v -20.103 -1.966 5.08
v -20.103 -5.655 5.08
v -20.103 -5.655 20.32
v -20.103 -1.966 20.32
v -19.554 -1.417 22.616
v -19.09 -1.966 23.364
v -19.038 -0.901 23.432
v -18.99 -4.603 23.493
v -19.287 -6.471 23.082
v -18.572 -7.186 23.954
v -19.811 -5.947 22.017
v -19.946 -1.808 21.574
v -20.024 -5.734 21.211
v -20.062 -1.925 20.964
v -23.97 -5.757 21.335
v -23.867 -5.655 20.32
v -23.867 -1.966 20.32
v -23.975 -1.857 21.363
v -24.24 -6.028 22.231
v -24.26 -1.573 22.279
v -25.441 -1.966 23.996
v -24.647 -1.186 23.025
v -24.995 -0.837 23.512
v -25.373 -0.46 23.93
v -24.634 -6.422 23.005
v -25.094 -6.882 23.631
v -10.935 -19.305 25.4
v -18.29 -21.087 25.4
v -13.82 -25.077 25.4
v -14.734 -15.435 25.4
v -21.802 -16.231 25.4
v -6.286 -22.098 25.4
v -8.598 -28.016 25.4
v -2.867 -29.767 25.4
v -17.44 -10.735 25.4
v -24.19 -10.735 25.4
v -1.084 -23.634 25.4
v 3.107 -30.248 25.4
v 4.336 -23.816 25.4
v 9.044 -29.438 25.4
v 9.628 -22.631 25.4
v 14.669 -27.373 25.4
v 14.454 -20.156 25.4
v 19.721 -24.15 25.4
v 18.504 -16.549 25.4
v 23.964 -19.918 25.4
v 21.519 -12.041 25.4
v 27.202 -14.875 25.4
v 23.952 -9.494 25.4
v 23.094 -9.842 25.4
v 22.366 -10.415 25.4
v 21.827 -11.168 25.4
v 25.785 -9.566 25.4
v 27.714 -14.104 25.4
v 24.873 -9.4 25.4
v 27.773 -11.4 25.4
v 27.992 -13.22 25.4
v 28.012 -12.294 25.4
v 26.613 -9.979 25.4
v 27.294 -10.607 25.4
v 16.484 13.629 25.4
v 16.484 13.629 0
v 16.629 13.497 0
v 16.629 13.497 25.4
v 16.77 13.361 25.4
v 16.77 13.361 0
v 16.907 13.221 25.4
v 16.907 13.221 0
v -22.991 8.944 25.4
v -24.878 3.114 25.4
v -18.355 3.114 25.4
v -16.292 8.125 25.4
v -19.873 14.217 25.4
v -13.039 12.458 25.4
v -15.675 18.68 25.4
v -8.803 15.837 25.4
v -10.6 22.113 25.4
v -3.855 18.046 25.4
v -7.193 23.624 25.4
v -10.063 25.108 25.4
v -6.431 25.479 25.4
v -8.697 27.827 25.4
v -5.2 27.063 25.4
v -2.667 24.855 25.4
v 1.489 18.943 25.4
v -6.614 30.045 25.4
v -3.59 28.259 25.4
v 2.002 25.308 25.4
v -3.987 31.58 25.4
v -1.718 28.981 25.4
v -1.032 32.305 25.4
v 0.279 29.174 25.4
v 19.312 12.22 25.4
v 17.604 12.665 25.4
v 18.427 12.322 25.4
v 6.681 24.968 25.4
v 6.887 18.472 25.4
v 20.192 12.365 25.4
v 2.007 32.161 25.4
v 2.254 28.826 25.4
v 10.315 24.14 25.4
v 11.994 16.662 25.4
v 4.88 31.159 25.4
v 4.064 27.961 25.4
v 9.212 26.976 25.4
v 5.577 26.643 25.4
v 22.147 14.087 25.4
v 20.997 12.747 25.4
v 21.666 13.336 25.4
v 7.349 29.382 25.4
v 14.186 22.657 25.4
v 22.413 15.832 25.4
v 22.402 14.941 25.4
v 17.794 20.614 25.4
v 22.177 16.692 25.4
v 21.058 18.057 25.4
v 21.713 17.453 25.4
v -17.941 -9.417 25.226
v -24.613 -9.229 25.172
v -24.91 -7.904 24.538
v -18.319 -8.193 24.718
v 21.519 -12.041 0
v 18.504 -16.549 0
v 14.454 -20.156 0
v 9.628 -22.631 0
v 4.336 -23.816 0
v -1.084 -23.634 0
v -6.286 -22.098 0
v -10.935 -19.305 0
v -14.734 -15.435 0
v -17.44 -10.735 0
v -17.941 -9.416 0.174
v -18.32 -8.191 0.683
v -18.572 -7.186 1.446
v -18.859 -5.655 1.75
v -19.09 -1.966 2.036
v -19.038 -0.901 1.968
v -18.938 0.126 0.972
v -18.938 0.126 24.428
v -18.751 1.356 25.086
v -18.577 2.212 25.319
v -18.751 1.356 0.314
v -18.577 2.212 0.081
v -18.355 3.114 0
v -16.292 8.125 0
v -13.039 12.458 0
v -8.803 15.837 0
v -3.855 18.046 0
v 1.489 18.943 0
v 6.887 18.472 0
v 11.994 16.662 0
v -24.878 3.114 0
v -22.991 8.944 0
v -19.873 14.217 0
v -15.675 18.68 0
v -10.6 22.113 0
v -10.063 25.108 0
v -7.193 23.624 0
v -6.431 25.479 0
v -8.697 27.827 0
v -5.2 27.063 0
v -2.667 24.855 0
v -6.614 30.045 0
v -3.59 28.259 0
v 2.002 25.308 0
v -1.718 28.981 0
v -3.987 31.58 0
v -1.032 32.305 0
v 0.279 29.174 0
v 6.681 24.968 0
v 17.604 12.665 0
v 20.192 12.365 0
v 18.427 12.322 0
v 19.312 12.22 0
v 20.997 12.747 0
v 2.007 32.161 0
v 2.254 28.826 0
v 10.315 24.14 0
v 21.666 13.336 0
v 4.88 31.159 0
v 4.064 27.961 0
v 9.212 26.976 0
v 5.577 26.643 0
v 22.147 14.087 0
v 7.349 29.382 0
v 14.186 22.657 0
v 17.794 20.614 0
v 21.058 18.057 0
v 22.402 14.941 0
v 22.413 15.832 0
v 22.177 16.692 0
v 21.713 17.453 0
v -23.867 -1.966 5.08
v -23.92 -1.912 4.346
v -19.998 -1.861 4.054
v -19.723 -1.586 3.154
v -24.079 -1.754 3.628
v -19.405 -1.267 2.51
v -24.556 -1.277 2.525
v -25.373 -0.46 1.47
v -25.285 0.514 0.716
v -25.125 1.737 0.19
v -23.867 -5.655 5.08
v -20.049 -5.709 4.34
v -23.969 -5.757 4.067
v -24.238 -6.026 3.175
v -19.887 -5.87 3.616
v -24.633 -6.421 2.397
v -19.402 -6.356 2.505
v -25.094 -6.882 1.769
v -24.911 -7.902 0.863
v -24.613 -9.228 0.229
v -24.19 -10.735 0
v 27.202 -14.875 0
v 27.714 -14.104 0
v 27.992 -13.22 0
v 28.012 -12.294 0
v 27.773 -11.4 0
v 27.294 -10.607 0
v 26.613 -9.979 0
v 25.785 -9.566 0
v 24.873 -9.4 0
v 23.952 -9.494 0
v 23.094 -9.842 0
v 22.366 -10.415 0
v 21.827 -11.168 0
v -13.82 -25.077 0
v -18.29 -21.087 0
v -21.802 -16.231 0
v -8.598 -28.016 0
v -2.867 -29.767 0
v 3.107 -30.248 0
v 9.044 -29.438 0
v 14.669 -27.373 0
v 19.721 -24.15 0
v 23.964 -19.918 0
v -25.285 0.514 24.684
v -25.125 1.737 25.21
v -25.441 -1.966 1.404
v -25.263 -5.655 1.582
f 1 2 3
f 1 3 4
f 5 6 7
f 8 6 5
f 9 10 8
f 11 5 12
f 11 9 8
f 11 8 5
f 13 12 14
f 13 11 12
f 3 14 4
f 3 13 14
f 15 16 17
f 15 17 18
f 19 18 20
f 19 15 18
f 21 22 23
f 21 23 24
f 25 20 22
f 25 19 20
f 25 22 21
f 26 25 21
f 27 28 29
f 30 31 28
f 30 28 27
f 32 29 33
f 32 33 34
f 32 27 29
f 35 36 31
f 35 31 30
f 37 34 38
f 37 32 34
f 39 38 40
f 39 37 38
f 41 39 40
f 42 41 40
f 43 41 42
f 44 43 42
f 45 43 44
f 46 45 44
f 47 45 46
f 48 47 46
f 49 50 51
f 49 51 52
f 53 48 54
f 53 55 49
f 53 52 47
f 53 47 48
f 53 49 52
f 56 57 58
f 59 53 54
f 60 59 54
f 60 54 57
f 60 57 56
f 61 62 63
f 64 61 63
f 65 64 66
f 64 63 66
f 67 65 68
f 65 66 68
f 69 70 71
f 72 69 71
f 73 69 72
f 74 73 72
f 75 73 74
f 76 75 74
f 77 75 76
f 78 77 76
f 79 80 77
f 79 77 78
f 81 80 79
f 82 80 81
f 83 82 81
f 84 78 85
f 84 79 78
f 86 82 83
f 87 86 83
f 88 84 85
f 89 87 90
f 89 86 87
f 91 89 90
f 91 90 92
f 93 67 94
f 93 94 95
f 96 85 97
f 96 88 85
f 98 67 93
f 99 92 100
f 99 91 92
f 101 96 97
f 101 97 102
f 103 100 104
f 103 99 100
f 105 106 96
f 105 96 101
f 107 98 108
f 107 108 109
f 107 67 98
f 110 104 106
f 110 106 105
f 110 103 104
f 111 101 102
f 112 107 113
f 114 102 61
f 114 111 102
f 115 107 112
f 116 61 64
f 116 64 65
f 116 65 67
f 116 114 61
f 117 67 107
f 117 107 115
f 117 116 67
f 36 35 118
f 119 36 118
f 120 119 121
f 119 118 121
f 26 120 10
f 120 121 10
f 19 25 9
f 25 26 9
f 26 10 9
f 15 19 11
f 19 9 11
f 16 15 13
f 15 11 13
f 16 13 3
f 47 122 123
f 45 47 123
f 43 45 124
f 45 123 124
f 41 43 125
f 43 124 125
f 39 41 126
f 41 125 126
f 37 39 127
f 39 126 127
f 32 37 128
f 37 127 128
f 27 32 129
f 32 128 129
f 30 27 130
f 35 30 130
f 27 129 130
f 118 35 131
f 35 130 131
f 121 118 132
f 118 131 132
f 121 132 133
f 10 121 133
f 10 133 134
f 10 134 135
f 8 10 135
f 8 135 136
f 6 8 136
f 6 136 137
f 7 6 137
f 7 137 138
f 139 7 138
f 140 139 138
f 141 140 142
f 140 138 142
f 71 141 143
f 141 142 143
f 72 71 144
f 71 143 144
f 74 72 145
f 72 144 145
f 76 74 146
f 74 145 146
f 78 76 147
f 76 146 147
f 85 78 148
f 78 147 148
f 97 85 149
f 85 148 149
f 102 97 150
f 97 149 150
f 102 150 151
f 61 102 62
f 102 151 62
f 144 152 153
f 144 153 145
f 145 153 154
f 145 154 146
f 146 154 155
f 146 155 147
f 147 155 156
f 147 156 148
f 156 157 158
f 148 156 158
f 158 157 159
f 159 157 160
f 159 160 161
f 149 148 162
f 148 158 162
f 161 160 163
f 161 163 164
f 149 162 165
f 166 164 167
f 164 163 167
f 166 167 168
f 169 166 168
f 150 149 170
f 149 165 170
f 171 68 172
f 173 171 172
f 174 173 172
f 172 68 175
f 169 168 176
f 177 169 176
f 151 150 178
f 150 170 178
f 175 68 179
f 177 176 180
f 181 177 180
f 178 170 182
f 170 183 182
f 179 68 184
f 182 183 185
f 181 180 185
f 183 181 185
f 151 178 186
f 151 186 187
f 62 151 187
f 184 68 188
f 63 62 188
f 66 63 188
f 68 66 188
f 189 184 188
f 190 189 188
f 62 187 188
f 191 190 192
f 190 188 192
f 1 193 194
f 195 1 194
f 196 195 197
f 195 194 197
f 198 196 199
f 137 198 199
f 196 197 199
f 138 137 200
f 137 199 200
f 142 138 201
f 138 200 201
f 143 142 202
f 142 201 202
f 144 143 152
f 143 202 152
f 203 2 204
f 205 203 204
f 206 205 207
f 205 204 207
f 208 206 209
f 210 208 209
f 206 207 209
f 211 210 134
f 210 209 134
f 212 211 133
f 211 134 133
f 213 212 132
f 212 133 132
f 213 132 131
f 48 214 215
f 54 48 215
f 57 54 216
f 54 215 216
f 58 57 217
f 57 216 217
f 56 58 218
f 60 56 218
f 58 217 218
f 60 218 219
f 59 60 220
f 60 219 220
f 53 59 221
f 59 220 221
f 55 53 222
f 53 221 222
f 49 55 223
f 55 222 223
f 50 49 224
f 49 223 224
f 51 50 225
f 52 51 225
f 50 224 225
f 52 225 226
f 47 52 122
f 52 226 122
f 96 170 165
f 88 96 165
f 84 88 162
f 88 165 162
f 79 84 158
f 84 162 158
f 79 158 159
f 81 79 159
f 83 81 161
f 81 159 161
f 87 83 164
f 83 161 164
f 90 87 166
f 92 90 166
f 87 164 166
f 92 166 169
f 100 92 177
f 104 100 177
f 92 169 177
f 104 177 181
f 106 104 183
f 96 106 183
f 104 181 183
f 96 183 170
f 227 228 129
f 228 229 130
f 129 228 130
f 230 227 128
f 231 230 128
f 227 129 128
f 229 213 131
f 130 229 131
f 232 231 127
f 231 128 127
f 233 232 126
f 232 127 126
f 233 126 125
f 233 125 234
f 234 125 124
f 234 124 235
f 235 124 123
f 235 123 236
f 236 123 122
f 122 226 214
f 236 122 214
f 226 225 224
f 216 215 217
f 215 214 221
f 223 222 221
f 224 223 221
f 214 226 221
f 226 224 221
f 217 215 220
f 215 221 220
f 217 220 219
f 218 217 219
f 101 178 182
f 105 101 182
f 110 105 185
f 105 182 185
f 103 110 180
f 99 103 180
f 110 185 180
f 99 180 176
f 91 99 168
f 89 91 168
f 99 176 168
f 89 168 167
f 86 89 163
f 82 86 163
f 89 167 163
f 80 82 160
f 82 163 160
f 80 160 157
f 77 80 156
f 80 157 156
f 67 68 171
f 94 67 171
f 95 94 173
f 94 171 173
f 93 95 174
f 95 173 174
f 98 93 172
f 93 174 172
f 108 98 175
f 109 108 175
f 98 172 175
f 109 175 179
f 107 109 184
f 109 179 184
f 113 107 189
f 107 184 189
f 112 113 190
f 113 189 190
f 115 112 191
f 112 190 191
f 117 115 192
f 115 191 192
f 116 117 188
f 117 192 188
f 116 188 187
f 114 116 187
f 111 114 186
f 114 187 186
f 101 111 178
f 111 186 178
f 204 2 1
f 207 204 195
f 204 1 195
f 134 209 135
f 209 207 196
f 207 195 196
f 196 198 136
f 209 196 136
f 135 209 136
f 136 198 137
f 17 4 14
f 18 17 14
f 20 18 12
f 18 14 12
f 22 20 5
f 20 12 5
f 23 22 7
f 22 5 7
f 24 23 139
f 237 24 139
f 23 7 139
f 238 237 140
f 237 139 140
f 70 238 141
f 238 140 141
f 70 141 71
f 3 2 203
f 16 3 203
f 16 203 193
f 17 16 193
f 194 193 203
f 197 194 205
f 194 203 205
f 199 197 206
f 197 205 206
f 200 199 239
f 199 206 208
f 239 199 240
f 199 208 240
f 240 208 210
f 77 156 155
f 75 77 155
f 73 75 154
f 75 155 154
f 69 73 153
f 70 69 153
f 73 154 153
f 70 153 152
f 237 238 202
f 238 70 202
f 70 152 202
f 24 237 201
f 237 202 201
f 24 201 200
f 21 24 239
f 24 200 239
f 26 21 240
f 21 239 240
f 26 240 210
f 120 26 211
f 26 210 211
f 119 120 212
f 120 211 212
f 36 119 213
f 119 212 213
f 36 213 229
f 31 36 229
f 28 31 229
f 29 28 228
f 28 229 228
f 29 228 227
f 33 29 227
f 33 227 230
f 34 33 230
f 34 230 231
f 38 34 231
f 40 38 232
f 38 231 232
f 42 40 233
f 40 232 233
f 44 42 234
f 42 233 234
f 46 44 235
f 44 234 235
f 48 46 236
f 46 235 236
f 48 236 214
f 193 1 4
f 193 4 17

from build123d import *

# Parameters (mm, degrees)
F0_W         = 3.7644430995
F0_H         = 3.6893493962
F1_DEPTH     = 25.4
F3_DEPTH     = 25.4
F4_T1_DEPTH  = 3.6893493962
F5_T1_DEPTH  = 3.6893493962
F6_T4_DEPTH  = 31.7513819576
F6_S5_R      = 5.0800000001
F6_T6_DEPTH  = 18
F6_S7_R      = 5.0799999999
F6_T8_DEPTH  = 18
F6_T12_DEPTH = 31.8046354707
F6_S13_R     = 5.0800000001
F6_T14_DEPTH = 18
F6_S15_R     = 5.0799999999
F6_T16_DEPTH = 18
F7_T1_DEPTH  = 3.6893493962
F7_T3_DEPTH  = 3.7644430995
F7_T9_DEPTH  = 16.3893493962
F7_S11_R     = 27.7843331243
F7_T12_DEPTH = 10
F7_T15_DEPTH = 16.4644430995
F7_S17_R     = 27.7843331243
F7_T18_DEPTH = 10
F7_T24_DEPTH = 16.4644430995
F7_S26_R     = 27.7843331243
F7_T27_DEPTH = 10
F7_T30_DEPTH = 16.3893493962
F7_S32_R     = 27.7843331243
F7_T33_DEPTH = 10
F7_T39_DEPTH = 16.3893493962
F7_S41_R     = 21.4343331243
F7_T42_DEPTH = 10
F7_T45_DEPTH = 16.4644430995
F7_S47_R     = 21.4343331243
F7_T48_DEPTH = 10
F7_T54_DEPTH = 16.3893493962
F7_S56_R     = 21.4343331243
F7_T57_DEPTH = 10
F7_T60_DEPTH = 16.4644430995
F7_S62_R     = 21.4343331243
F7_T63_DEPTH = 10


# Not quite as in the source:
# - a fillet or chamfer that OpenCascade refuses, or shapes differently, is made with other operations: its cross-section is extruded or revolved along the edge and cut away or added


with BuildPart() as f1:
    # F0 (on Top) → F1 (new body)
    with BuildSketch(Plane.XY):
        with BuildLine():
            ThreePointArc((21.5192791075, -12.0412250981), (-18.6952618922, -6.6001770911), (16.4842832794, 13.628859286))
            ThreePointArc((16.4842832794, 13.628859286), (16.7004899528, 13.4298852219), (16.9072606144, 13.2211224445))
            ThreePointArc((16.9072606144, 13.2211224445), (21.6662962935, 13.3359323022), (21.0575650897, 18.0572719658))
            ThreePointArc((21.0575650897, 18.0572719658), (-24.9747625183, -7.5703236346), (27.2017178865, -14.8753721518))
            ThreePointArc((27.2017178865, -14.8753721518), (26.2135164235, -9.7430147231), (21.5192791075, -12.0412250981))
        make_face()
        with Locations((-21.9849217683, -3.8102302933)):
            Rectangle(F0_W, F0_H, mode=Mode.SUBTRACT)
    extrude(amount=F1_DEPTH)

    # F2 (on Top) → F3 (join)
    with BuildSketch(Plane.XY):
        with BuildLine():
            ThreePointArc((-7.1930247185, 23.6237348024), (-0.7260554424, 29.1452143248), (6.6808082429, 24.968277878))
            ThreePointArc((6.6808082429, 24.968277878), (8.51162891, 24.6152301343), (10.3146480708, 24.140183894))
            ThreePointArc((10.3146480708, 24.140183894), (-1.0323167037, 32.3054087872), (-10.6002305361, 22.1132778988))
            ThreePointArc((-10.6002305361, 22.1132778988), (-8.9219828274, 22.9257012198), (-7.1930247185, 23.6237348025))
        make_face()
    extrude(amount=F3_DEPTH)

    # F4: fillet of radius 5.08 on 1 edges, made by hand

    # F4_s2 → F4_t1 (cut)
    with BuildSketch(Plane.XZ.offset(1.9655555952)):
        with BuildLine():
            ThreePointArc((-15.0227002186, 25.4), (-18.614802667, 23.9121024484), (-20.1027002186, 20.32))
            Line((-20.1027002186, 20.32), (-20.1027002186, 25.4))
            Line((-20.1027002186, 25.4), (-15.0227002186, 25.4))
        make_face()
    extrude(amount=F4_T1_DEPTH, mode=Mode.SUBTRACT)

    # F5: fillet of radius 5.08 on 1 edges, made by hand

    # F5_s2 → F5_t1 (cut)
    with BuildSketch(Plane.XZ.offset(1.9655555952)):
        with BuildLine():
            ThreePointArc((-28.9471433181, 25.4), (-25.3550408696, 23.9121024484), (-23.8671433181, 20.32))
            Line((-23.8671433181, 20.32), (-23.8671433181, 25.4))
            Line((-23.8671433181, 25.4), (-28.9471433181, 25.4))
        make_face()
    extrude(amount=F5_T1_DEPTH, mode=Mode.SUBTRACT)

    # F6: fillet of radius 5.08 on 2 edges, made by hand


with BuildPart() as f6_tool2:
    # F6_s3 → F6_t4 (new body)
    with BuildSketch(Plane.YZ.offset(-6.3899983285)):
        with BuildLine():
            ThreePointArc((-1.9655555952, 20.32), (-0.4776580437, 23.9121024484), (3.1144444048, 25.4))
            Line((3.1144444048, 25.4), (-1.9655555952, 25.4))
            Line((-1.9655555952, 25.4), (-1.9655555952, 20.32))
        make_face()
    extrude(amount=-F6_T4_DEPTH)

    # F6_s5 → F6_t6 (cut, symmetric)
    with BuildSketch(Plane.XZ.offset(-0.6)):
        with Locations((-15.0227002185, 20.3199999999)):
            Circle(F6_S5_R)
    extrude(amount=F6_T6_DEPTH, both=True, mode=Mode.SUBTRACT)

    # F6_s7 → F6_t8 (cut, symmetric)
    with BuildSketch(Plane.XZ.offset(-0.6)):
        with Locations((-28.947143318, 20.3200000001)):
            Circle(F6_S7_R)
    extrude(amount=F6_T8_DEPTH, both=True, mode=Mode.SUBTRACT)


with BuildPart() as f1_1:
    add(f1.part)

    # F6_t1: cut F6_tool2
    add(f6_tool2.part, mode=Mode.SUBTRACT)


with BuildPart() as f6_tool10:
    # F6_s11 → F6_t12 (new body)
    with BuildSketch(Plane.YZ.offset(-6.1587934503)):
        with BuildLine():
            ThreePointArc((-10.7349049914, 25.4), (-7.142802543, 23.9121024484), (-5.6549049914, 20.32))
            Line((-5.6549049914, 20.32), (-5.6549049914, 25.4))
            Line((-5.6549049914, 25.4), (-10.7349049914, 25.4))
        make_face()
    extrude(amount=-F6_T12_DEPTH)

    # F6_s13 → F6_t14 (cut, symmetric)
    with BuildSketch(Plane.XZ.offset(8.2)):
        with Locations((-15.0227002185, 20.3199999999)):
            Circle(F6_S13_R)
    extrude(amount=F6_T14_DEPTH, both=True, mode=Mode.SUBTRACT)

    # F6_s15 → F6_t16 (cut, symmetric)
    with BuildSketch(Plane.XZ.offset(8.2)):
        with Locations((-28.947143318, 20.3200000001)):
            Circle(F6_S15_R)
    extrude(amount=F6_T16_DEPTH, both=True, mode=Mode.SUBTRACT)


with BuildPart() as f1_2:
    add(f1_1.part)

    # F6_t9: cut F6_tool10
    add(f6_tool10.part, mode=Mode.SUBTRACT)

    # F7: fillet of radius 5.08 on 4 edges, made by hand

    # F7_s2 → F7_t1 (cut)
    with BuildSketch(Plane.XZ.offset(1.9655555952)):
        with BuildLine():
            ThreePointArc((-23.8671433181, 5.08), (-25.3550408696, 1.4878975516), (-28.9471433181, 0))
            Line((-28.9471433181, 0), (-23.8671433181, 0))
            Line((-23.8671433181, 0), (-23.8671433181, 5.08))
        make_face()
        with BuildLine():
            ThreePointArc((-20.1027002186, 5.08), (-18.614802667, 1.4878975516), (-15.0227002186, 0))
            Line((-15.0227002186, 0), (-20.1027002186, 0))
            Line((-20.1027002186, 0), (-20.1027002186, 5.08))
        make_face()
    extrude(amount=F7_T1_DEPTH, mode=Mode.SUBTRACT)

    # F7_s4 → F7_t3 (cut)
    with BuildSketch(Plane.YZ.offset(-23.8671433181)):
        with BuildLine():
            ThreePointArc((-5.6549049914, 5.08), (-7.142802543, 1.4878975516), (-10.7349049914, 0))
            Line((-10.7349049914, 0), (-5.6549049914, 0))
            Line((-5.6549049914, 0), (-5.6549049914, 5.08))
        make_face()
        with BuildLine():
            ThreePointArc((-1.9655555952, 5.08), (-0.4776580437, 1.4878975516), (3.1144444048, 0))
            Line((3.1144444048, 0), (-1.9655555952, 0))
            Line((-1.9655555952, 0), (-1.9655555952, 5.08))
        make_face()
    extrude(amount=F7_T3_DEPTH, mode=Mode.SUBTRACT)


with BuildPart() as f7_tool7:
    # F7_s8 → F7_t9 (new body)
    with BuildSketch(Plane.XZ.offset(18.3549049914)):
        with BuildLine():
            ThreePointArc((-23.8671433181, 5.08), (-25.3550408696, 1.4878975516), (-28.9471433181, 0))
            Line((-28.9471433181, 0), (-23.8671433181, 0))
            Line((-23.8671433181, 0), (-23.8671433181, 5.08))
        make_face()
    extrude(amount=-F7_T9_DEPTH)

    split(bisect_by=Plane.XZ.offset(5.6549049914), keep=Keep.TOP)

    # F7_s11 → F7_t12 (intersect, symmetric)
    with BuildSketch(Plane.XY.offset(2.5)):
        with Locations((2.3382892257, -2.4746027243)):
            Circle(F7_S11_R)
    extrude(amount=F7_T12_DEPTH, both=True, mode=Mode.INTERSECT)


with BuildPart() as f7_tool13:
    # F7_s14 → F7_t15 (new body)
    with BuildSketch(Plane.YZ.offset(-20.1027002186)):
        with BuildLine():
            ThreePointArc((-5.6549049914, 5.08), (-7.142802543, 1.4878975516), (-10.7349049914, 0))
            Line((-10.7349049914, 0), (-5.6549049914, 0))
            Line((-5.6549049914, 0), (-5.6549049914, 5.08))
        make_face()
    extrude(amount=-F7_T15_DEPTH)

    split(bisect_by=Plane.YZ.offset(-23.8671433181), keep=Keep.BOTTOM)

    # F7_s17 → F7_t18 (intersect, symmetric)
    with BuildSketch(Plane.XY.offset(2.5)):
        with Locations((2.3382892257, -2.4746027243)):
            Circle(F7_S17_R)
    extrude(amount=F7_T18_DEPTH, both=True, mode=Mode.INTERSECT)


with BuildPart() as f7_tool7_1:
    add(f7_tool7.part)

    # F7_t19: intersect F7_tool13
    add(f7_tool13.part, mode=Mode.INTERSECT)


with BuildPart() as f1_3:
    add(f1_2.part)

    # F7_t5: cut F7_tool7
    add(f7_tool7_1.part, mode=Mode.SUBTRACT)


with BuildPart() as f7_tool22:
    # F7_s23 → F7_t24 (new body)
    with BuildSketch(Plane.YZ.offset(-36.5671433181)):
        with BuildLine():
            ThreePointArc((-1.9655555952, 5.08), (-0.4776580437, 1.4878975516), (3.1144444048, 0))
            Line((3.1144444048, 0), (-1.9655555952, 0))
            Line((-1.9655555952, 0), (-1.9655555952, 5.08))
        make_face()
    extrude(amount=F7_T24_DEPTH)

    split(bisect_by=Plane.YZ.offset(-23.8671433181), keep=Keep.BOTTOM)

    # F7_s26 → F7_t27 (intersect, symmetric)
    with BuildSketch(Plane.XY.offset(2.5)):
        with Locations((2.3382892257, -2.4746027243)):
            Circle(F7_S26_R)
    extrude(amount=F7_T27_DEPTH, both=True, mode=Mode.INTERSECT)


with BuildPart() as f7_tool28:
    # F7_s29 → F7_t30 (new body)
    with BuildSketch(Plane.XZ.offset(5.6549049914)):
        with BuildLine():
            ThreePointArc((-23.8671433181, 5.08), (-25.3550408696, 1.4878975516), (-28.9471433181, 0))
            Line((-28.9471433181, 0), (-23.8671433181, 0))
            Line((-23.8671433181, 0), (-23.8671433181, 5.08))
        make_face()
    extrude(amount=-F7_T30_DEPTH)

    split(bisect_by=Plane.XZ.offset(1.9655555952), keep=Keep.BOTTOM)

    # F7_s32 → F7_t33 (intersect, symmetric)
    with BuildSketch(Plane.XY.offset(2.5)):
        with Locations((2.3382892257, -2.4746027243)):
            Circle(F7_S32_R)
    extrude(amount=F7_T33_DEPTH, both=True, mode=Mode.INTERSECT)


with BuildPart() as f7_tool22_1:
    add(f7_tool22.part)

    # F7_t34: intersect F7_tool28
    add(f7_tool28.part, mode=Mode.INTERSECT)


with BuildPart() as f1_4:
    add(f1_3.part)

    # F7_t20: cut F7_tool22
    add(f7_tool22_1.part, mode=Mode.SUBTRACT)


with BuildPart() as f7_tool37:
    # F7_s38 → F7_t39 (new body)
    with BuildSketch(Plane.XZ.offset(-10.7344444048)):
        with BuildLine():
            ThreePointArc((-20.1027002186, 5.08), (-18.614802667, 1.4878975516), (-15.0227002186, 0))
            Line((-15.0227002186, 0), (-20.1027002186, 0))
            Line((-20.1027002186, 0), (-20.1027002186, 5.08))
        make_face()
    extrude(amount=F7_T39_DEPTH)

    split(bisect_by=Plane.XZ.offset(1.9655555952), keep=Keep.BOTTOM)

    # F7_s41 → F7_t42 (cut, symmetric)
    with BuildSketch(Plane.XY.offset(2.5)):
        with Locations((2.3382892257, -2.4746027243)):
            Circle(F7_S41_R)
    extrude(amount=F7_T42_DEPTH, both=True, mode=Mode.SUBTRACT)


with BuildPart() as f7_tool43:
    # F7_s44 → F7_t45 (new body)
    with BuildSketch(Plane.YZ.offset(-23.8671433181)):
        with BuildLine():
            ThreePointArc((-1.9655555952, 5.08), (-0.4776580437, 1.4878975516), (3.1144444048, 0))
            Line((3.1144444048, 0), (-1.9655555952, 0))
            Line((-1.9655555952, 0), (-1.9655555952, 5.08))
        make_face()
    extrude(amount=F7_T45_DEPTH)

    split(bisect_by=Plane.YZ.offset(-20.1027002186), keep=Keep.TOP)

    # F7_s47 → F7_t48 (cut, symmetric)
    with BuildSketch(Plane.XY.offset(2.5)):
        with Locations((2.3382892257, -2.4746027243)):
            Circle(F7_S47_R)
    extrude(amount=F7_T48_DEPTH, both=True, mode=Mode.SUBTRACT)


with BuildPart() as f7_tool37_1:
    add(f7_tool37.part)

    # F7_t49: intersect F7_tool43
    add(f7_tool43.part, mode=Mode.INTERSECT)


with BuildPart() as f1_5:
    add(f1_4.part)

    # F7_t35: cut F7_tool37
    add(f7_tool37_1.part, mode=Mode.SUBTRACT)


with BuildPart() as f7_tool52:
    # F7_s53 → F7_t54 (new body)
    with BuildSketch(Plane.XZ.offset(1.9655555952)):
        with BuildLine():
            ThreePointArc((-20.1027002186, 5.08), (-18.614802667, 1.4878975516), (-15.0227002186, 0))
            Line((-15.0227002186, 0), (-20.1027002186, 0))
            Line((-20.1027002186, 0), (-20.1027002186, 5.08))
        make_face()
    extrude(amount=F7_T54_DEPTH)

    split(bisect_by=Plane.XZ.offset(5.6549049914), keep=Keep.TOP)

    # F7_s56 → F7_t57 (cut, symmetric)
    with BuildSketch(Plane.XY.offset(2.5)):
        with Locations((2.3382892257, -2.4746027243)):
            Circle(F7_S56_R)
    extrude(amount=F7_T57_DEPTH, both=True, mode=Mode.SUBTRACT)


with BuildPart() as f7_tool58:
    # F7_s59 → F7_t60 (new body)
    with BuildSketch(Plane.YZ.offset(-7.4027002186)):
        with BuildLine():
            ThreePointArc((-5.6549049914, 5.08), (-7.142802543, 1.4878975516), (-10.7349049914, 0))
            Line((-10.7349049914, 0), (-5.6549049914, 0))
            Line((-5.6549049914, 0), (-5.6549049914, 5.08))
        make_face()
    extrude(amount=-F7_T60_DEPTH)

    split(bisect_by=Plane.YZ.offset(-20.1027002186), keep=Keep.TOP)

    # F7_s62 → F7_t63 (cut, symmetric)
    with BuildSketch(Plane.XY.offset(2.5)):
        with Locations((2.3382892257, -2.4746027243)):
            Circle(F7_S62_R)
    extrude(amount=F7_T63_DEPTH, both=True, mode=Mode.SUBTRACT)


with BuildPart() as f7_tool52_1:
    add(f7_tool52.part)

    # F7_t64: intersect F7_tool58
    add(f7_tool58.part, mode=Mode.INTERSECT)


with BuildPart() as f1_6:
    add(f1_5.part)

    # F7_t50: cut F7_tool52
    add(f7_tool52_1.part, mode=Mode.SUBTRACT)


solid = f1_6.part
